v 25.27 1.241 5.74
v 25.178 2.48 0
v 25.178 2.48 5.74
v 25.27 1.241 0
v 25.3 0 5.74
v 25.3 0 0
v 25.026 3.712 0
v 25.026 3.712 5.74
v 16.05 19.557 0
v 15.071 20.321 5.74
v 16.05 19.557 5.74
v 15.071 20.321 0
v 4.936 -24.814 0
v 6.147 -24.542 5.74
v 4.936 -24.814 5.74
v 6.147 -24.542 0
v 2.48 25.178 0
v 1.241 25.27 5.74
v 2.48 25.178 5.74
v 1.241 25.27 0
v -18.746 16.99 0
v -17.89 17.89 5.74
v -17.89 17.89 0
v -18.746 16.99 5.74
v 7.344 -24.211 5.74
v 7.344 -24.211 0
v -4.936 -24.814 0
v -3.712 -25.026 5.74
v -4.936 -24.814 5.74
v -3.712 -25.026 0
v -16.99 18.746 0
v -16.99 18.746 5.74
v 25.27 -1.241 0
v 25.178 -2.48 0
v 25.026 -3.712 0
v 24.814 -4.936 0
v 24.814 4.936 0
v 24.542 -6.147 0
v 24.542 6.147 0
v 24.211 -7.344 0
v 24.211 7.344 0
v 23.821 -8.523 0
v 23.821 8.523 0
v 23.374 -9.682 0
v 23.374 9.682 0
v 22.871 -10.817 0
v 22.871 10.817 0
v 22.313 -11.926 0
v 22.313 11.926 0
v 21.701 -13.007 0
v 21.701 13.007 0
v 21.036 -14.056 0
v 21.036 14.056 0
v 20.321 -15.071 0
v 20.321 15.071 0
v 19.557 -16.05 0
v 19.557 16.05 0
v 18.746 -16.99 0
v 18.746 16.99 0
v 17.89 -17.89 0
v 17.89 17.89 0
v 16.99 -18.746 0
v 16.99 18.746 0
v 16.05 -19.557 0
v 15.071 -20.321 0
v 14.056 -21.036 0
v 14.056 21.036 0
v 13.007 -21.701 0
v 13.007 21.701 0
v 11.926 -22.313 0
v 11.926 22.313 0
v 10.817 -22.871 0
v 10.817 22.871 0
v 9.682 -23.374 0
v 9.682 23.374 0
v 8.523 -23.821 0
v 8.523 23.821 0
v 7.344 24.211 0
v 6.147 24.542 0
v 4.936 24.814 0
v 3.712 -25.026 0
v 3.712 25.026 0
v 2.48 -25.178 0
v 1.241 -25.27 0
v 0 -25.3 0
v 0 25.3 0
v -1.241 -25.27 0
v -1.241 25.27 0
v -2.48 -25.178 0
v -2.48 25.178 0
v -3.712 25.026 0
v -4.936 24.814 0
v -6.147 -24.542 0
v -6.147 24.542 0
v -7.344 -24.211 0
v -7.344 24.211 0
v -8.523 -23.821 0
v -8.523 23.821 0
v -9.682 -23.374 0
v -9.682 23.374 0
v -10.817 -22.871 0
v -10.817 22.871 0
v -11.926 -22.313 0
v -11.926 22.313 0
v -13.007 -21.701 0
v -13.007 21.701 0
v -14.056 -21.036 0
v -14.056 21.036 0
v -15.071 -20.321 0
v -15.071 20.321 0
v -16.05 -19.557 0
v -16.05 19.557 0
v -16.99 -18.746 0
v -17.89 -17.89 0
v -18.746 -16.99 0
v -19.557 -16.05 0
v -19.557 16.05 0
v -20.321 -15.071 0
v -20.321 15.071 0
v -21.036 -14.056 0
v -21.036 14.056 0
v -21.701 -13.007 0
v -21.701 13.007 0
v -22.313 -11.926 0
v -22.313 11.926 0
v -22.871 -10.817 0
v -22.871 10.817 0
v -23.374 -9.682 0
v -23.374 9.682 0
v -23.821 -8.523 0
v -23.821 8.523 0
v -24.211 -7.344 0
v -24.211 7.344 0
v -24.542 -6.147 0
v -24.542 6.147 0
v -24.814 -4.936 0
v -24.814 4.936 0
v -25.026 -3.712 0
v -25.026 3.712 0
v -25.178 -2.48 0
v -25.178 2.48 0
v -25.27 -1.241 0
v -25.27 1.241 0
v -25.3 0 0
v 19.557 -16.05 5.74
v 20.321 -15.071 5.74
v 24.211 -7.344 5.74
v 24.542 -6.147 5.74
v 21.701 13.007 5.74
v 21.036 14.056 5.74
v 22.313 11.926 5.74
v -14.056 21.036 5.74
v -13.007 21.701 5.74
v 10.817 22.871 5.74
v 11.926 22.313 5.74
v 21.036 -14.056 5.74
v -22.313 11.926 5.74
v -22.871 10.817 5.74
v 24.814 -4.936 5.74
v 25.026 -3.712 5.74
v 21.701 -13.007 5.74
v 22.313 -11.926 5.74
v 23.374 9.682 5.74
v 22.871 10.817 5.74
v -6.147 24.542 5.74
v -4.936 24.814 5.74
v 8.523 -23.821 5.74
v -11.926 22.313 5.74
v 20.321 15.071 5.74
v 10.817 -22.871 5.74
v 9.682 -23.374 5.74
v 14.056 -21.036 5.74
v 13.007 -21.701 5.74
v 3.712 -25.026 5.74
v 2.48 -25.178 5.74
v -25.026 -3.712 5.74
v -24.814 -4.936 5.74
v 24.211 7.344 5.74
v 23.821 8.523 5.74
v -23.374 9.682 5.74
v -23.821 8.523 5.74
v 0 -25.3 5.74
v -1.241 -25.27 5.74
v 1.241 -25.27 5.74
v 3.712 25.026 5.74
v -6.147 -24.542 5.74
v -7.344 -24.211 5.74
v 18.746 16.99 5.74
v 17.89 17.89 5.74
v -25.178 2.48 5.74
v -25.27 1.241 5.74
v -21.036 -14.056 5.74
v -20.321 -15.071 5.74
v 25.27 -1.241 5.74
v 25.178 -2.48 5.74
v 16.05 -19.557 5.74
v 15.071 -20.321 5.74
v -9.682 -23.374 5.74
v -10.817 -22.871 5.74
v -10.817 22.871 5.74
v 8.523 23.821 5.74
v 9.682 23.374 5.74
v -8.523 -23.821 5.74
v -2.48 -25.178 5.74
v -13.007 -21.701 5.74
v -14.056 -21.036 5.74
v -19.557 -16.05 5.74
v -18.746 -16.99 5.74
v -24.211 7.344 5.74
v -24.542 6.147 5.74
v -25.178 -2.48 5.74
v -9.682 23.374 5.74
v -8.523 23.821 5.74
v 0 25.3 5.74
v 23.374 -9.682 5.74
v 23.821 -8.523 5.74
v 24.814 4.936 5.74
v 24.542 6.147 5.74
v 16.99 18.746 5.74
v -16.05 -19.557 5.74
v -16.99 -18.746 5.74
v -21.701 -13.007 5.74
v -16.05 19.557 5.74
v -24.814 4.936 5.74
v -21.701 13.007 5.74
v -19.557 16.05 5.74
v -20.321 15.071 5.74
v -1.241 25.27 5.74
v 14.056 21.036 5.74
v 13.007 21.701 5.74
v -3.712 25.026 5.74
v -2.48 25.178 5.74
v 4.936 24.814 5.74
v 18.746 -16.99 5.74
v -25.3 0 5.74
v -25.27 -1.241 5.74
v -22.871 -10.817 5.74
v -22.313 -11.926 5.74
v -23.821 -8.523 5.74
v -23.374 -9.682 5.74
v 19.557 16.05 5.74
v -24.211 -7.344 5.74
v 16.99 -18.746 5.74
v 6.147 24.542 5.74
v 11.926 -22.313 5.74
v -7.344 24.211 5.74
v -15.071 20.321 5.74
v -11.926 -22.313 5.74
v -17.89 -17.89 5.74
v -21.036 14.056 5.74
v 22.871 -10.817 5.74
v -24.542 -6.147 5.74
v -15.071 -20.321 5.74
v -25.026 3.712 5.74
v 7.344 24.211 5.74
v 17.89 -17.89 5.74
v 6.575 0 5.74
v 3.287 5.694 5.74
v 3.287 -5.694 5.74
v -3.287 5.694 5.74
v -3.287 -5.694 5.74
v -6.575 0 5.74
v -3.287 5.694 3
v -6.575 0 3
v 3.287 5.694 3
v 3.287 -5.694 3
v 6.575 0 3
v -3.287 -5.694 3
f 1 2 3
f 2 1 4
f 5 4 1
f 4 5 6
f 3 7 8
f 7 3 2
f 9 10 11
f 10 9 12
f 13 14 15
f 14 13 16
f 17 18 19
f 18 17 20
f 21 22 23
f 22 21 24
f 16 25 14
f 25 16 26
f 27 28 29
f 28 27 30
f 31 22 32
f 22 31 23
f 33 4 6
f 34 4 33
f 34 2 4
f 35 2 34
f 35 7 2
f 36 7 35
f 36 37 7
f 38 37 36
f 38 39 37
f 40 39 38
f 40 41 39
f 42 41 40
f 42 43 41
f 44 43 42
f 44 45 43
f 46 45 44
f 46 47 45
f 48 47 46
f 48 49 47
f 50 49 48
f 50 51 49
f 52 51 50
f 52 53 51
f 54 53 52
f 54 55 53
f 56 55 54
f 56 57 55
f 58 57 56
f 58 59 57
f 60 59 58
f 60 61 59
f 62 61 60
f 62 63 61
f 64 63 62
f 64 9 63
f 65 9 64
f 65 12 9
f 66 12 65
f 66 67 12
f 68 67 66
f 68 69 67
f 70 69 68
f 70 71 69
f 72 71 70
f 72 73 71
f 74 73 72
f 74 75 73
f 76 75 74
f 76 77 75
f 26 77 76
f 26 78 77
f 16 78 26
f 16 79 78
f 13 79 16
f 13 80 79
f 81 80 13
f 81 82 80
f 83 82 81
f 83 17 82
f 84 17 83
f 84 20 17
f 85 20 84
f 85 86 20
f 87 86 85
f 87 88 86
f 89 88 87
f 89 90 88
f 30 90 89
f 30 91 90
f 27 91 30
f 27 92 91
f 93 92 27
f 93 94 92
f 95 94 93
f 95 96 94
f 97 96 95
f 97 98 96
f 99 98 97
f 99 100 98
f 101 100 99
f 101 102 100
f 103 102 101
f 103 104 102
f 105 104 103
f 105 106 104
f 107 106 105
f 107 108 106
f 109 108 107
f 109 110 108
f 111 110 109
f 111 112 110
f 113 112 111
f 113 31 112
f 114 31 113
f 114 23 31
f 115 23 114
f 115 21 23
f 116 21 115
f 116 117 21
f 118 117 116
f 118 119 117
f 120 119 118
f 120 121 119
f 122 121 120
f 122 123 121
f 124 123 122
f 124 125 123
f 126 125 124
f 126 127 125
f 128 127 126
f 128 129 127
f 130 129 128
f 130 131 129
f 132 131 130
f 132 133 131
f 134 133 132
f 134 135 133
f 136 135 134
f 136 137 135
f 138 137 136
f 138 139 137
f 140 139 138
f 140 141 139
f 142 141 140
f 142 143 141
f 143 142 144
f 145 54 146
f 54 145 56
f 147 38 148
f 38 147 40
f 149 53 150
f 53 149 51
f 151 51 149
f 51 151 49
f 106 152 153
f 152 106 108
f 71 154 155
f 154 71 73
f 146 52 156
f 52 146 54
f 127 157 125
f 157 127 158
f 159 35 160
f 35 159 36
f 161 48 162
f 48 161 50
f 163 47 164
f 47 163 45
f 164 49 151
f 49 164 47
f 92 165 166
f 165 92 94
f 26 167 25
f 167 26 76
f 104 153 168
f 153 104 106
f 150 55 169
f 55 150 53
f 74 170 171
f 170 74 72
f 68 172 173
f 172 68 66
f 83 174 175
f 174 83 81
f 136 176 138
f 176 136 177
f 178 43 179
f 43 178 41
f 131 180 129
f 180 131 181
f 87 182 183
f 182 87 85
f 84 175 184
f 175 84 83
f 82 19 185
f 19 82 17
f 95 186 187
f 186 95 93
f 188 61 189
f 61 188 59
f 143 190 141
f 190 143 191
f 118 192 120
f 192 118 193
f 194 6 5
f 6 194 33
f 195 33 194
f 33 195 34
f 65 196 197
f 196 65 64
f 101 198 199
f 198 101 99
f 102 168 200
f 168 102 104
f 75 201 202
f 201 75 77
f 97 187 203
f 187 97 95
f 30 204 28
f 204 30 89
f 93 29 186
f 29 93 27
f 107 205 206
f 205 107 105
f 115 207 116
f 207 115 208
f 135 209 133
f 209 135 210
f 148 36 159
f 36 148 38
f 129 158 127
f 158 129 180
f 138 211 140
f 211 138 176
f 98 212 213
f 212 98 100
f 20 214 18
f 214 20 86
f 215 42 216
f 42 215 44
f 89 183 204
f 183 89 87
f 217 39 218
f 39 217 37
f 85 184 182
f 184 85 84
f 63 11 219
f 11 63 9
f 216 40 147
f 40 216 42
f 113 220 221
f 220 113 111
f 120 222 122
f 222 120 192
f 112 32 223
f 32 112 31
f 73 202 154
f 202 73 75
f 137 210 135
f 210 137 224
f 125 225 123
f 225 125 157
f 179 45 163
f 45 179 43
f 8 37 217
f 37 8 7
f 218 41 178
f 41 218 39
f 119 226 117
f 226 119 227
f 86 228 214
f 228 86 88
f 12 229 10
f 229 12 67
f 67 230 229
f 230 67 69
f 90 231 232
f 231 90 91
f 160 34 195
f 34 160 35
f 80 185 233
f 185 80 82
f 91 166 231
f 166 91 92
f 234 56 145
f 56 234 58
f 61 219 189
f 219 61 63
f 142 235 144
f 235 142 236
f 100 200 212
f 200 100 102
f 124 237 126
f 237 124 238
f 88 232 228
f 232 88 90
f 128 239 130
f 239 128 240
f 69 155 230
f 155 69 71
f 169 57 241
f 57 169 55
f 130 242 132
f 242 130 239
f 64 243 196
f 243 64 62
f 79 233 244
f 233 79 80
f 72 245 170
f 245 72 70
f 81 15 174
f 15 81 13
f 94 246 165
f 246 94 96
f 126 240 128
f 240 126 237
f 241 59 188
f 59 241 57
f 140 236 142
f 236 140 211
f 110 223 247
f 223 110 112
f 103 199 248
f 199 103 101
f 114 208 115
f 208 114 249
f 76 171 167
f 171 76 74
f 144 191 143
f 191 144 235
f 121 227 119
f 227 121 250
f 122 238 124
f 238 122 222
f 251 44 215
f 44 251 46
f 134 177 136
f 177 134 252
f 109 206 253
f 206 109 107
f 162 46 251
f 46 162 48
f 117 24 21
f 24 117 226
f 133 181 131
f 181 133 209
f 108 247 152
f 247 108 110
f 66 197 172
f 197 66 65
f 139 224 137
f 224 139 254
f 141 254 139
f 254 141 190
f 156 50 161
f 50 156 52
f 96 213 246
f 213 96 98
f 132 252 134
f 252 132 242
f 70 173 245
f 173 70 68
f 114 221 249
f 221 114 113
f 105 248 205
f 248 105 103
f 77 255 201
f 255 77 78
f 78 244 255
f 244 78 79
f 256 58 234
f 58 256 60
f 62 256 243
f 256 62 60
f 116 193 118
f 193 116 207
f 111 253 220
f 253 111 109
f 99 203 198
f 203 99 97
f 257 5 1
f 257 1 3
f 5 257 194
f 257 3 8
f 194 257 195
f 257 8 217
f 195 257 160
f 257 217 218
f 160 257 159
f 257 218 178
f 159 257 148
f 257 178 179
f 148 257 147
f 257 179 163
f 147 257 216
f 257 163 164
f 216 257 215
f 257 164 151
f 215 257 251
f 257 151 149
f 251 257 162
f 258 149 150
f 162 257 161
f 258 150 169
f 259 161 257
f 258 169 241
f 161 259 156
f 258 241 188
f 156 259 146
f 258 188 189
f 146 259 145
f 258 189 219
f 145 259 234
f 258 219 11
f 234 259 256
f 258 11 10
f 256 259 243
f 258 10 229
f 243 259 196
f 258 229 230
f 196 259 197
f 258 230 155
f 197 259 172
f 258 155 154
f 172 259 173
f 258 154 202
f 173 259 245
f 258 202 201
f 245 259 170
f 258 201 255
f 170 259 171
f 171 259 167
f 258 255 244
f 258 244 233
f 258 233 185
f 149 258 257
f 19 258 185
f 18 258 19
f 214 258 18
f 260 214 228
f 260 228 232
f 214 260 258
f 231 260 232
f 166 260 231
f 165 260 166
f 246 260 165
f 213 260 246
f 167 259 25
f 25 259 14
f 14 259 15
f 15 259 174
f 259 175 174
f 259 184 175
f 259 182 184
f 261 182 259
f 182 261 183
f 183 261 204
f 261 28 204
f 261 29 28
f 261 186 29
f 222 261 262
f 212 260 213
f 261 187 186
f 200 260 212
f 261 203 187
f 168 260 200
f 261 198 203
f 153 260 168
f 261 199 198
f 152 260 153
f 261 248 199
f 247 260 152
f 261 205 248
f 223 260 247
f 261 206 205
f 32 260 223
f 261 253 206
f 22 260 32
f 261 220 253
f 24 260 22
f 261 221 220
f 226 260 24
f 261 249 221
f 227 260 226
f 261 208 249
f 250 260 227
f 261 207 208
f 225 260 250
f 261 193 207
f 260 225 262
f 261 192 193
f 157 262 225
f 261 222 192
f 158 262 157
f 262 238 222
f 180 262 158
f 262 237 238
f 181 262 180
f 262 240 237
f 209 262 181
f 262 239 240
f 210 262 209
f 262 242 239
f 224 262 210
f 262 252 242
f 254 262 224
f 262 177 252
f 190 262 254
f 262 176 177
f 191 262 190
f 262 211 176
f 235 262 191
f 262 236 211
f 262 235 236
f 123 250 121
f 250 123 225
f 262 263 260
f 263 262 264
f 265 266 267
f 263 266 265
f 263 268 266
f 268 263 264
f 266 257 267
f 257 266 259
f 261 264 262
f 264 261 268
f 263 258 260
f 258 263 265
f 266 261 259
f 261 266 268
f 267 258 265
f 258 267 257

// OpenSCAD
$fn=128;
overlap = 0.1;

module solid(){
union() {
cylinder(h=5.74, d=50.6);
}
}

module remove(){

translate([0,0,3]) linear_extrude(height = 10, convexity = 10) circle(r=13.15/2, $fn=6);


}

difference(){
    solid();
    remove();
}
